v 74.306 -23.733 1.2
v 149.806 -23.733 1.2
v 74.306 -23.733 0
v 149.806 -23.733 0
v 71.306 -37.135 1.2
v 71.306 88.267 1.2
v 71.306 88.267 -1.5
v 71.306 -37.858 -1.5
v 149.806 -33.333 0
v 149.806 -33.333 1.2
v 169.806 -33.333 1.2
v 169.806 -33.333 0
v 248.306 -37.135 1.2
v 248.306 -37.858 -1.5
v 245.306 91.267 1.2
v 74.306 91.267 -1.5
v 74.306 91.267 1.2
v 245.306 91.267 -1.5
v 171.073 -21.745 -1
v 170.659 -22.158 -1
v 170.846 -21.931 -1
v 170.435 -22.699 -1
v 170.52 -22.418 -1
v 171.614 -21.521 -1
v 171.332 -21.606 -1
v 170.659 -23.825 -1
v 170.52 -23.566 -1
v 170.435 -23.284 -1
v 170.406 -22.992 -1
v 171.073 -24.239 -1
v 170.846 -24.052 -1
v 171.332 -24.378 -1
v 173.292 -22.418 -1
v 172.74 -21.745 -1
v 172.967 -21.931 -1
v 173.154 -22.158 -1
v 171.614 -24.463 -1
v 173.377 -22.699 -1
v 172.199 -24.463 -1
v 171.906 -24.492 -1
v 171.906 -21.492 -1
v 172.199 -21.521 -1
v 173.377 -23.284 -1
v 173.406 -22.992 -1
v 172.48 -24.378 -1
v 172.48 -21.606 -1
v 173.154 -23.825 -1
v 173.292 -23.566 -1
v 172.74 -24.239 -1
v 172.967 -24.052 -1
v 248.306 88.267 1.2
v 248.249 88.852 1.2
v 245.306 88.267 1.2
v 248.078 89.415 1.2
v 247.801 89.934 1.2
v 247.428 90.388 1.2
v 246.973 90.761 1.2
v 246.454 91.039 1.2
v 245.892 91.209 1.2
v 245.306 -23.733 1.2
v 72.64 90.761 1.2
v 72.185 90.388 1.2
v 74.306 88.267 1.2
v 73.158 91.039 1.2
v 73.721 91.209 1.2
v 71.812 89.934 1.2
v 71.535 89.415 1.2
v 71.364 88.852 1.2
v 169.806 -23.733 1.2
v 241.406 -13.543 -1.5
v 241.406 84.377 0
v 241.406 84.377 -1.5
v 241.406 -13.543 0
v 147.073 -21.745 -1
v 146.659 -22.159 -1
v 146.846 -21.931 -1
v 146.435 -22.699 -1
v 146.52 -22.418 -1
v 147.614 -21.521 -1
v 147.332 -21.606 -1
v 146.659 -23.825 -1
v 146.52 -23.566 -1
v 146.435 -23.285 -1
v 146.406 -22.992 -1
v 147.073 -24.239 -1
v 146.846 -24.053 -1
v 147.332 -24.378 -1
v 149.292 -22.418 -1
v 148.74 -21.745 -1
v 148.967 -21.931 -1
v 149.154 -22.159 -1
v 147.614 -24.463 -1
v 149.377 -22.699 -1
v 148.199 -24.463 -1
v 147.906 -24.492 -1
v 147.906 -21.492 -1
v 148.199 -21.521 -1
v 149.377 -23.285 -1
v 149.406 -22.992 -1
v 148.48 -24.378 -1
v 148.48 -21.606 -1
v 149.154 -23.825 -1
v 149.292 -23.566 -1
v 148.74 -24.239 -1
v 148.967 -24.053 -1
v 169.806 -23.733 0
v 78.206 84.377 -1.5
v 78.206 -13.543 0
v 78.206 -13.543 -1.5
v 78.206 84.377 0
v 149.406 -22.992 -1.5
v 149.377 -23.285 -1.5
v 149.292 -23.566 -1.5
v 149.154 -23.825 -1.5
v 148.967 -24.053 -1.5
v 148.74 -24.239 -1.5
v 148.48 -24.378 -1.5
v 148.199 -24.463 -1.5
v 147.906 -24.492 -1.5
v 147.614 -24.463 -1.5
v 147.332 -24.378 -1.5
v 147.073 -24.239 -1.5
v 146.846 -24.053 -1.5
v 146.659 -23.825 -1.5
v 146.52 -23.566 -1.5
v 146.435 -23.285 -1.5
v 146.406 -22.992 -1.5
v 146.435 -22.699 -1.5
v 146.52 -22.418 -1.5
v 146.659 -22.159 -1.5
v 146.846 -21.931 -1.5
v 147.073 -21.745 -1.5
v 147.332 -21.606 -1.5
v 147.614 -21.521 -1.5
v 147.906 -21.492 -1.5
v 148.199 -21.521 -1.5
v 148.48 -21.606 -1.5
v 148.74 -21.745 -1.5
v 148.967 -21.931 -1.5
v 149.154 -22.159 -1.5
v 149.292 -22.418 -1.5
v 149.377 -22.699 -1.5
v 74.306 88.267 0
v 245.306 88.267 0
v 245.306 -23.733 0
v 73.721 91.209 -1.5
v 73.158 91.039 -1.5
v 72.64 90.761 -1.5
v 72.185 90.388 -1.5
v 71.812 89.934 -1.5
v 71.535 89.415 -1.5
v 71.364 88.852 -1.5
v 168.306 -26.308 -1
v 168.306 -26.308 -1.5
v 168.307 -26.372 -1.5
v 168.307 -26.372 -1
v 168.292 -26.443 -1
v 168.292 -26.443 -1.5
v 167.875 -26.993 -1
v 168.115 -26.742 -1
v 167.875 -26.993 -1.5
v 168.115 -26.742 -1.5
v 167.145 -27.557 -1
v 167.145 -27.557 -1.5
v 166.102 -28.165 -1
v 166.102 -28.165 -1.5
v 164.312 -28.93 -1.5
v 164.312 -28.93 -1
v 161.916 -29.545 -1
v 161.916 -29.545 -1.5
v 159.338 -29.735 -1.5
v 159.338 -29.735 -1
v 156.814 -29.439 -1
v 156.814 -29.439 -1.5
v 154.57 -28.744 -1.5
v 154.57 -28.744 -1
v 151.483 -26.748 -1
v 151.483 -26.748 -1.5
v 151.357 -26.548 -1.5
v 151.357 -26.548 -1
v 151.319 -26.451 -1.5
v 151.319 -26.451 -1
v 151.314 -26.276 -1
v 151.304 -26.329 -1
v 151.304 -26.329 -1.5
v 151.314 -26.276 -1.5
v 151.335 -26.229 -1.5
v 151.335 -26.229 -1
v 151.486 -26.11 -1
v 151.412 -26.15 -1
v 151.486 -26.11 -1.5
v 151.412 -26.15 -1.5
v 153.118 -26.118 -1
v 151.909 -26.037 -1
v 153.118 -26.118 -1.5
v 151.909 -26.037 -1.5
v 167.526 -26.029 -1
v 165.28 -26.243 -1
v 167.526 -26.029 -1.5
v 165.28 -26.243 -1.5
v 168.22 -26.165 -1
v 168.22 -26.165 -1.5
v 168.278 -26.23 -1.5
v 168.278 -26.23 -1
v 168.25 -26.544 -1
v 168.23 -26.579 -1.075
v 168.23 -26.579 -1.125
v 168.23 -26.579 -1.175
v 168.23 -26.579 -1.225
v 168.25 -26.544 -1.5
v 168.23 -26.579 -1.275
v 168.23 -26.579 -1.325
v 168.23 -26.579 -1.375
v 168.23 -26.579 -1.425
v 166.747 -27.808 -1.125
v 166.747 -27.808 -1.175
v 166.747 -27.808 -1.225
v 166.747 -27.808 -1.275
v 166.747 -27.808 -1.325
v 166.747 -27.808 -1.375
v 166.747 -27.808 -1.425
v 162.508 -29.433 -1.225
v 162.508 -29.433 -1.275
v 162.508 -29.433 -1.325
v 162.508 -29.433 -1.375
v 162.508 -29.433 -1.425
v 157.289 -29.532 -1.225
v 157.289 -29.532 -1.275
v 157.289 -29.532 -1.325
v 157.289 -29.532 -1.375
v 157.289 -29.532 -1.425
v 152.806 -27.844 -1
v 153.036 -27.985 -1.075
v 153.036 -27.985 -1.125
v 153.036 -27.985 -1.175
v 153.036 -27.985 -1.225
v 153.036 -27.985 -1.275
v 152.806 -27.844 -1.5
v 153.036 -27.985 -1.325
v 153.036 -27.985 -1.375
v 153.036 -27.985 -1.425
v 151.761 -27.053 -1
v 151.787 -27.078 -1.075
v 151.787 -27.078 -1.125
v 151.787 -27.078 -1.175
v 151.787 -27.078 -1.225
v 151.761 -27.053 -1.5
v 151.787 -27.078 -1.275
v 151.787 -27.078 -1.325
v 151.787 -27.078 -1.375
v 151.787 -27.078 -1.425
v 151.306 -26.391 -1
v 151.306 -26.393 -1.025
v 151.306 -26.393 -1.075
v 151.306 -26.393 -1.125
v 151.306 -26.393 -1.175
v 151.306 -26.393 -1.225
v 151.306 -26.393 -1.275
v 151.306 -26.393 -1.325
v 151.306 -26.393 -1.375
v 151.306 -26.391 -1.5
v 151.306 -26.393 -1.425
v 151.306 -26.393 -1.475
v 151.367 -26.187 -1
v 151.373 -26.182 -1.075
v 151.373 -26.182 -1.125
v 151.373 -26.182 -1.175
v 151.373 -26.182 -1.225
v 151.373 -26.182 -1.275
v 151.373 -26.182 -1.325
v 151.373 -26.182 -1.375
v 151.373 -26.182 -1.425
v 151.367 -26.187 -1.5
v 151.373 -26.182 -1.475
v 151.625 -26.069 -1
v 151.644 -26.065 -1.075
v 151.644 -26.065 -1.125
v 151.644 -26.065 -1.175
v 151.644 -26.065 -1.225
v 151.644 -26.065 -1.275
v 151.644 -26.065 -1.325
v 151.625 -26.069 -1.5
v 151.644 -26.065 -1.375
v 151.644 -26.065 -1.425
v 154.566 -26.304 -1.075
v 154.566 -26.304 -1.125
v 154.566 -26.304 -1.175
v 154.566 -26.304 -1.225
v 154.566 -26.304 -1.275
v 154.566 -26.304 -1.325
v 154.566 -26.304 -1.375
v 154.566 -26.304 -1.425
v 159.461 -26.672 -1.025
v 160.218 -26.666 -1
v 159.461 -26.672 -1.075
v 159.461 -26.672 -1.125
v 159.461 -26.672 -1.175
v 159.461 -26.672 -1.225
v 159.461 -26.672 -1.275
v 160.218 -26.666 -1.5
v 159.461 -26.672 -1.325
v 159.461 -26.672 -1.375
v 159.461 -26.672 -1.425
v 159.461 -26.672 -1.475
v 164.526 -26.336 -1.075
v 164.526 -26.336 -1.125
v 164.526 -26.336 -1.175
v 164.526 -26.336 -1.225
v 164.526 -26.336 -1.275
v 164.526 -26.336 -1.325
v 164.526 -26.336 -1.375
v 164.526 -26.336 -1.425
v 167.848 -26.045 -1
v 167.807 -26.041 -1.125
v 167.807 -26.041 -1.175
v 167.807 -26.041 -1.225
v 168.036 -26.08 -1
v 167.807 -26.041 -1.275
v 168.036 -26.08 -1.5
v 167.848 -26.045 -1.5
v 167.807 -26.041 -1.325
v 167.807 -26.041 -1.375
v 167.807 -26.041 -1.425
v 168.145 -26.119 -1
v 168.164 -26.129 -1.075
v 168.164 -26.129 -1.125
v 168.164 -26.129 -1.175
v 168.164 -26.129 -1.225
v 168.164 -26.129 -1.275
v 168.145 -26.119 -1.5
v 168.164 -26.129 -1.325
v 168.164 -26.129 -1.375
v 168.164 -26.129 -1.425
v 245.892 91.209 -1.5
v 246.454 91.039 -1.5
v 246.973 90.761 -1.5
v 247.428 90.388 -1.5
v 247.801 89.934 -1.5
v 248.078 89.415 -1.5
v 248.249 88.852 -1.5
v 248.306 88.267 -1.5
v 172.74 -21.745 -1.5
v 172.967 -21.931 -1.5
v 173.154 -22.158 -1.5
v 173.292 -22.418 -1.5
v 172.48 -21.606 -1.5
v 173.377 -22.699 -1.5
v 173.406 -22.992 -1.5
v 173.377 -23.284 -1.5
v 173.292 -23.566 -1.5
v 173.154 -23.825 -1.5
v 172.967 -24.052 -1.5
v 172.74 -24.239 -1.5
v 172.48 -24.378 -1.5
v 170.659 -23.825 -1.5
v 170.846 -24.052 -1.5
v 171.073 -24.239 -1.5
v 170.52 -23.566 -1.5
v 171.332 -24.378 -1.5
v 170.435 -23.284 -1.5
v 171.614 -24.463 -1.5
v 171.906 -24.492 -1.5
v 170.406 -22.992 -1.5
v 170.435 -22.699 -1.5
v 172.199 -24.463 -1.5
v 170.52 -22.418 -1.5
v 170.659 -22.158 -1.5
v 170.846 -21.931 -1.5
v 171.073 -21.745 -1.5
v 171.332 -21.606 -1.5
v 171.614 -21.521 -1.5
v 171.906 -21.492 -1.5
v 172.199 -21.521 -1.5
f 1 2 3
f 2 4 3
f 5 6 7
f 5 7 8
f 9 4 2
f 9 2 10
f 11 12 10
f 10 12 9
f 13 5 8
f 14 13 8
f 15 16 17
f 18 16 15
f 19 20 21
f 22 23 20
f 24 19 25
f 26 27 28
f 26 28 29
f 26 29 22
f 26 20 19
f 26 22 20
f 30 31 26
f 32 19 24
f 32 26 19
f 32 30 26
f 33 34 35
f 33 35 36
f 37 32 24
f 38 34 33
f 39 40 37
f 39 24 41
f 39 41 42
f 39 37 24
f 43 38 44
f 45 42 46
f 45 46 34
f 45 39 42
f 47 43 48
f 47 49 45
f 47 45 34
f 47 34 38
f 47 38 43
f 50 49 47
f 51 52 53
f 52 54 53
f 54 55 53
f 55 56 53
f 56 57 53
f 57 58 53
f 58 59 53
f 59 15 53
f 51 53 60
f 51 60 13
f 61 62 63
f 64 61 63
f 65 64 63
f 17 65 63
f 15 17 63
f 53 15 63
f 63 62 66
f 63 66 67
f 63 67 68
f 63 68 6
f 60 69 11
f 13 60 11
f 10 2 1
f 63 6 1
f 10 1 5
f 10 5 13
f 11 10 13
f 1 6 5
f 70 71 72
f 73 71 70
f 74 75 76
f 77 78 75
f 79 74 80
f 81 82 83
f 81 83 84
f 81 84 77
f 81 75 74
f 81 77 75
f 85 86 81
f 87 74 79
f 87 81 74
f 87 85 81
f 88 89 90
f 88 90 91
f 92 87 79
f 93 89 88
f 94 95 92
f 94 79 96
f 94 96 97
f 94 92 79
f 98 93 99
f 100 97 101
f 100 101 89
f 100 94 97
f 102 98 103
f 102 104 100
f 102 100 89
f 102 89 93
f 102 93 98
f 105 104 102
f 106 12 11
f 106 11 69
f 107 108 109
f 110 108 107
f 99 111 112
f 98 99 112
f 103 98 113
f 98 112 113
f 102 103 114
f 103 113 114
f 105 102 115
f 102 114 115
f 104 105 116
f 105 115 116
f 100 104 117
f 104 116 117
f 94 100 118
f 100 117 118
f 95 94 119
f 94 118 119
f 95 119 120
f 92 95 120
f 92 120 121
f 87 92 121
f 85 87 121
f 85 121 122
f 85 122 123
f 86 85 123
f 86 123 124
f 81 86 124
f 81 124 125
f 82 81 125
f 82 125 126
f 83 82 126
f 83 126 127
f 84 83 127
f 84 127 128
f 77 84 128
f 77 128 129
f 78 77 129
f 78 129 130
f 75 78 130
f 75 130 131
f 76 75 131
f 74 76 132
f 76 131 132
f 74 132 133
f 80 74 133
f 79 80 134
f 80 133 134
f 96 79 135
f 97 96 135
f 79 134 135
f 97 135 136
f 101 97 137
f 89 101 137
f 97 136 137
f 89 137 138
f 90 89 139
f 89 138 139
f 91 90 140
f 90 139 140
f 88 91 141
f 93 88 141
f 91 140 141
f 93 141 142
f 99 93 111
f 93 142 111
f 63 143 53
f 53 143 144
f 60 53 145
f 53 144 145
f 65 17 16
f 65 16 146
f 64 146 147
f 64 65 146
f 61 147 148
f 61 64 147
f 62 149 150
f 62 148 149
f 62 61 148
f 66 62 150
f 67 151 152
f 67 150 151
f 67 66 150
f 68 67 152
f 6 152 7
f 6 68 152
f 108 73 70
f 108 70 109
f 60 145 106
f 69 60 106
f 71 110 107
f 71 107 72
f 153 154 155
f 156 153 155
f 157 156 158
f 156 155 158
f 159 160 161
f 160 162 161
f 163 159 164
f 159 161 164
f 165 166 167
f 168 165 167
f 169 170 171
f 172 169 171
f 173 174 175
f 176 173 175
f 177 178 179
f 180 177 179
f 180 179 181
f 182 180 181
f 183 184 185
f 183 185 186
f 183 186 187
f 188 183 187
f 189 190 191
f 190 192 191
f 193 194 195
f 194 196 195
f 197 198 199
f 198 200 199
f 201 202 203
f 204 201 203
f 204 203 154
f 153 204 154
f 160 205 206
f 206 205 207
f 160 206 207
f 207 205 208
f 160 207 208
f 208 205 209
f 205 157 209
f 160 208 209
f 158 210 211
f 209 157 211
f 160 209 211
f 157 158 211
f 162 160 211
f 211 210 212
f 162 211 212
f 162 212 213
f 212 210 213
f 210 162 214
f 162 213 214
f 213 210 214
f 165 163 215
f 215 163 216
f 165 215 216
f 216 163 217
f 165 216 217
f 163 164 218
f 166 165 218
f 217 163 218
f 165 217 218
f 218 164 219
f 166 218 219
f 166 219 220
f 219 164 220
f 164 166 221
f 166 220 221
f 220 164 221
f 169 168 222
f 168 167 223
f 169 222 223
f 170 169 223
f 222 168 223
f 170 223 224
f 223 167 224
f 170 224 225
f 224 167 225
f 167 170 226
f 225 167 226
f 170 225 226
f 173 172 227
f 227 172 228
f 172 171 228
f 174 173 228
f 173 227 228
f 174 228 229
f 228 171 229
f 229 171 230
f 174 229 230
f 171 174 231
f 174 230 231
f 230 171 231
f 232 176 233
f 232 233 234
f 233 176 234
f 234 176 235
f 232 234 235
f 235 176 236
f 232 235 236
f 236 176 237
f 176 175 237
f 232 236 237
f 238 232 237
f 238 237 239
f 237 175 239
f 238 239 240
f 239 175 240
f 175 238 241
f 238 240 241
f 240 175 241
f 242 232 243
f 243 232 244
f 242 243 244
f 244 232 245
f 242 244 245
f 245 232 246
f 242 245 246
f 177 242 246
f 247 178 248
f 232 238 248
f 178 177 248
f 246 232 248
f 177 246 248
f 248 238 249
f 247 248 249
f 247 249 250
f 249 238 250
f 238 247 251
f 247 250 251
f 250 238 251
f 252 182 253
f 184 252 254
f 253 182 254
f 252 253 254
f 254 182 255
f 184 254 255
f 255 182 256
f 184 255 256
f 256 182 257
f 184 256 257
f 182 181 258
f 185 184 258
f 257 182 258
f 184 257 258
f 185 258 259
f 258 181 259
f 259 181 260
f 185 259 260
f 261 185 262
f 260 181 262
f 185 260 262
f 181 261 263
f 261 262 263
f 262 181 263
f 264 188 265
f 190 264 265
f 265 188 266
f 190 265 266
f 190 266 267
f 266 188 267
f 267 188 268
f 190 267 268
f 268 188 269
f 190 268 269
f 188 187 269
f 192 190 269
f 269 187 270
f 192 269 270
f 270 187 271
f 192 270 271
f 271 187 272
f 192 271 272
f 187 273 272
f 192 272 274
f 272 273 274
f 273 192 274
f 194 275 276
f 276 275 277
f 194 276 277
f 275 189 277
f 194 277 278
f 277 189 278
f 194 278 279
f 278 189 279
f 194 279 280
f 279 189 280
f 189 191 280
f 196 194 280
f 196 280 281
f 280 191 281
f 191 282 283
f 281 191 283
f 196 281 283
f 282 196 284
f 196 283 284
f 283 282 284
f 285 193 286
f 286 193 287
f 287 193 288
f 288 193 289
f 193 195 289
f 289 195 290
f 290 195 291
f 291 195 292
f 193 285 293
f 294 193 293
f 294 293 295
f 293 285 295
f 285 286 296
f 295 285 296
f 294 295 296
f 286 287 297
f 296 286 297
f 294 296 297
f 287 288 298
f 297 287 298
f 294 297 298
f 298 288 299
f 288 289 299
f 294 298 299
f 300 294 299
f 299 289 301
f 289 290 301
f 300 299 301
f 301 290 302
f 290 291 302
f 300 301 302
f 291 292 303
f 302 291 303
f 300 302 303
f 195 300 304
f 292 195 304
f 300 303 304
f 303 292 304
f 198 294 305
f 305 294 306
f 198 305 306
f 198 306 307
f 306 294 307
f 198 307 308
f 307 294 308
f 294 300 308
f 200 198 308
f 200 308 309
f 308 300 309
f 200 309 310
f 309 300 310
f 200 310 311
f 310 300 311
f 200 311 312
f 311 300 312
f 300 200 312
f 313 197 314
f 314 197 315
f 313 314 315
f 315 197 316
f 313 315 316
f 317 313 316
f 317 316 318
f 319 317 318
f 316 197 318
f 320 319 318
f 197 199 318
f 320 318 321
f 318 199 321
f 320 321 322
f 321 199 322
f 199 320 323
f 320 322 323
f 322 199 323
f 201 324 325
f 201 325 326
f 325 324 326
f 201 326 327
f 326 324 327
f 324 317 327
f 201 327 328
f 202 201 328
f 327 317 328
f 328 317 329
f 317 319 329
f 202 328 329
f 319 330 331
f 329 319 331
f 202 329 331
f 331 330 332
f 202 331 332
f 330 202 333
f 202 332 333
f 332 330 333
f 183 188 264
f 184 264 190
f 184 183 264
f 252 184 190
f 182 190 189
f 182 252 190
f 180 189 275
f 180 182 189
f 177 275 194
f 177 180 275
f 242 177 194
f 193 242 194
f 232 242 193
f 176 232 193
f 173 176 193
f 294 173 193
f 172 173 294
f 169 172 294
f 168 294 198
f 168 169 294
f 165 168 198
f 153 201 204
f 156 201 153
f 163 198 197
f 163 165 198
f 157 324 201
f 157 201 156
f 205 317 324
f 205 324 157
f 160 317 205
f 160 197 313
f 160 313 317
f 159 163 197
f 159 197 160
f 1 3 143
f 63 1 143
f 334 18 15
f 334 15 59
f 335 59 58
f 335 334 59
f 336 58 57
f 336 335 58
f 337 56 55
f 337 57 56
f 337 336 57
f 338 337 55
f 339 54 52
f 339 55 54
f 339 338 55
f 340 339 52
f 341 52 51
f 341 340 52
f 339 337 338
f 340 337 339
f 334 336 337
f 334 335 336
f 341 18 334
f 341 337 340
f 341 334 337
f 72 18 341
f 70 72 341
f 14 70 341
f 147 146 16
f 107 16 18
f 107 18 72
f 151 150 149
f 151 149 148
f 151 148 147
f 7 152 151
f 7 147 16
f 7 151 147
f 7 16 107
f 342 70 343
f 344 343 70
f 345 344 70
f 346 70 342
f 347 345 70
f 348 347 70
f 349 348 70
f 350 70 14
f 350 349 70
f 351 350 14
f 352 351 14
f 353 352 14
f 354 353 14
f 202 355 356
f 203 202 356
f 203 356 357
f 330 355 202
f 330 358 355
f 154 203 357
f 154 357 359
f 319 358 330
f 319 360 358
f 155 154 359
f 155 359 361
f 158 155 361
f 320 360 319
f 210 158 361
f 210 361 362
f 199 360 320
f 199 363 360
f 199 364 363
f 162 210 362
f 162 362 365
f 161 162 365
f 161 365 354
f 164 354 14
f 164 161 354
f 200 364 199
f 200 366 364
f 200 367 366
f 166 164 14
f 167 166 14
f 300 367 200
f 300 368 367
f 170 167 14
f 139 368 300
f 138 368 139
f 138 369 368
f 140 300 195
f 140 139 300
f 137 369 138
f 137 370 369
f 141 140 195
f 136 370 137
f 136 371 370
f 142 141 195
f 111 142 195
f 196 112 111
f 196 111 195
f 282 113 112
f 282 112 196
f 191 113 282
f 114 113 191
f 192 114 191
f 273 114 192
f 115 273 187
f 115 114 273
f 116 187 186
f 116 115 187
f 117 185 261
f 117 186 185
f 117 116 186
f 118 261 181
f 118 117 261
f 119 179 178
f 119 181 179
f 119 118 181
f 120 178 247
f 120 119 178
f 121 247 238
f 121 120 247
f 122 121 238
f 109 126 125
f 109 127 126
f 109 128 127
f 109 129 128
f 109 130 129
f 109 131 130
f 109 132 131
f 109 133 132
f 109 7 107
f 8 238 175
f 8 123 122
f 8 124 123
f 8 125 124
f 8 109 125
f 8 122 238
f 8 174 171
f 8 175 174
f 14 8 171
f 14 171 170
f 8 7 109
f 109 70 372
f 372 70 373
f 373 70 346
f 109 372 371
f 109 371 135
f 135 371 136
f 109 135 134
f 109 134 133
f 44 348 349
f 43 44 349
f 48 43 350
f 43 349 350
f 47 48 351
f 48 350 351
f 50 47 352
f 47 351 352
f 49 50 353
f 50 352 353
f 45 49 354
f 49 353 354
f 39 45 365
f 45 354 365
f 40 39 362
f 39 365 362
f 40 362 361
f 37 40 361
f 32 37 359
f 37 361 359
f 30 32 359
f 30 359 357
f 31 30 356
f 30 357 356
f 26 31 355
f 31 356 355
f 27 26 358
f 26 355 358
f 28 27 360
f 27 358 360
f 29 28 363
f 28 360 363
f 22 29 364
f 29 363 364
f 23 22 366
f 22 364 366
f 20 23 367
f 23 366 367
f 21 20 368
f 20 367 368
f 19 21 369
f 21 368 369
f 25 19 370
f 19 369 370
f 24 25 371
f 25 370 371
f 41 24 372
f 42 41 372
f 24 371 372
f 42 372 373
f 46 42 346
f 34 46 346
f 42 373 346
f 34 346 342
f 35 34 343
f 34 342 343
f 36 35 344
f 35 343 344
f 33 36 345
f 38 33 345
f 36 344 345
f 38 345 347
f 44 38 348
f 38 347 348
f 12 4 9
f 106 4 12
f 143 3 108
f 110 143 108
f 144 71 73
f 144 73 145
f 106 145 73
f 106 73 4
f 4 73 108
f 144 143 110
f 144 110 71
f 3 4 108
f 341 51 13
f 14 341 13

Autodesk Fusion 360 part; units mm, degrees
sketch "Sketch1" plane through (0, 0, 0) normal (0, 0, 1) x (1, 0, 0)
  line L0 (78.2063, 84.3769) -> (241.4063, 84.3769)
  line L1 (241.4063, 84.3769) -> (241.4063, -13.5431)
  line L2 (241.4063, -13.5431) -> (78.2063, -13.5431)
  line L3 (78.2063, -13.5431) -> (78.2063, 84.3769)
  line L4 (74.7063, 87.8669) -> (244.9063, 87.8669)
  line L5 (244.9063, 87.8669) -> (244.9063, -23.3331)
  line L6 (244.9063, -23.3331) -> (74.7063, -23.3331)
  line L7 (74.7063, -23.3331) -> (74.7063, 87.8669)
  line L8 (74.7063, 87.8669) -> (244.9063, 87.8669)
  line L9 (244.9063, 87.8669) -> (244.9063, -33.3331)
  line L10 (244.9063, -33.3331) -> (74.7063, -33.3331)
  line L11 (74.7063, -33.3331) -> (74.7063, 87.8669)
  line L12 (149.8063, -33.3331) -> (169.8063, -33.3331)
  line L13 (169.8063, -33.3331) -> (169.8063, -23.3331)
  line L14 (169.8063, -23.3331) -> (149.8063, -23.3331)
  line L15 (149.8063, -23.3331) -> (149.8063, -33.3331)
  line L16 (71.3063, 91.2669) -> (248.3063, 91.2669)
  line L17 (248.3063, 91.2669) -> (248.3063, -36.7331)
  line L18 (248.3063, -36.7331) -> (71.3063, -36.7331)
  line L19 (71.3063, -36.7331) -> (71.3063, 91.2669)
  line L20 (74.3063, 88.2669) -> (245.3063, 88.2669)
  line L21 (245.3063, 88.2669) -> (245.3063, -23.7331)
  line L22 (245.3063, -23.7331) -> (74.3063, -23.7331)
  line L23 (74.3063, -23.7331) -> (74.3063, 88.2669)
  dimension "d1" = 97.92
  dimension "d2" = 163.2
  dimension "d3" = 170.2
  dimension "d4" = 3.5
  dimension "d5" = 111.2
  dimension "d6" = 3.49
  dimension "d7" = 10
  dimension "d8" = 20
  dimension "d9" = 75.1
  dimension "d11" = -3.4
  dimension "d34" = -0.4
  dimension "d35" = 75.1
extrude "Extrude1" add sketch "Sketch1" against normal blind 1.5 contours L4 L5 L7 L8 L9 L11 L20 L21 L22 L23 | L4 L5 L6 L7 L8 L9 L11 L14 | L6 L11 L15 L22 | L6 L9 L13 L22 | L6 L13 L14 L15 L22 | L10 L11 L15 L22 | L9 L10 L13 L22 | L10 L12 L13 L15 L22 | L16 L17 L18 L19
extrude "Extrude2" add sketch "Sketch1" along normal blind 1.2 contours L10 L11 L15 L22 | L9 L10 L13 L22 | L16 L17 L18 L19
sketch "Sketch2" plane through (71.3063, 0, 0) normal (-1, 0, 0) x (0, -1, 0)
  line L0 (-91.2669, 1.2) -> (-91.2669, -1.5)
  line L1 (-91.2669, -1.5) -> (36.7331, -1.5)
  line L2 (36.7331, -1.5) -> (36.7331, 1.2)
  line L3 (36.7331, 1.2) -> (-91.2669, 1.2)
  line L4 (36.7331, -1.5) -> (33.0912, -1.5)
  line L5 (33.0912, -1.5) -> (33.0912, 2.7)
  line L6 (33.0912, 2.7) -> (36.7331, 2.7)
  line L7 (36.7331, 2.7) -> (36.7331, -1.5)
  line L8 (36.7331, 2.7) -> (38.5941, -4.2455)
  line L9 (36.7331, 2.7) -> (43.6271, 2.7) construction
  line L10 (36.7331, -1.5) -> (39.5381, -1.5)
  line L11 (35.2766, 1.2) -> (42.4884, 1.2)
  dimension "d16" = 1.5
  dimension "d17" = 75
extrude "Extrude3" add sketch "Sketch2" against normal up to surface (177 mm away) contours L2 L7 L8 L10 L11
fillet "Fillet1" radius 3 2 edges at (71.3063, 91.2669, -0.15) (248.3063, 91.2669, -0.15)
sketch "Sketch3" plane through (0, 0, -1.5) normal (0, 0, -1) x (1, 0, 0)
  arc A0 (245.3063, -91.2669) -> (248.3063, -88.2669) centre (245.3063, -88.2669) ccw
  line L0 (248.3063, -88.2669) -> (248.3063, 37.8584)
  line L1 (248.3063, 37.8584) -> (71.3063, 37.8584)
  line L2 (71.3063, 37.8584) -> (71.3063, -88.2669)
  arc A1 (71.3063, -88.2669) -> (74.3063, -91.2669) centre (74.3063, -88.2669) ccw
  line L3 (74.3063, -91.2669) -> (245.3063, -91.2669)
  line L4 (78.2063, 13.5431) -> (241.4063, 13.5431)
  line L5 (241.4063, 13.5431) -> (241.4063, -84.3769)
  line L6 (241.4063, -84.3769) -> (78.2063, -84.3769)
  line L7 (78.2063, -84.3769) -> (78.2063, 13.5431)
  spline S0 degree 5 poles (168.3063, 26.3081) (168.3195, 26.3986) (168.2582, 26.6166) (167.9024, 27.0513) (166.9216, 27.7962) (164.9941, 28.7753) (162.5706, 29.5411) (159.8951, 29.8719) (157.2258, 29.6505) (154.8107, 28.9513) (152.8718, 27.9853) (151.5916, 27.0179) (151.0968, 26.2949) (151.4435, 25.9718) (152.5955, 26.024) (154.4375, 26.2989) (156.7949, 26.5955) (159.4487, 26.7323) (162.1514, 26.6209) (164.6413, 26.3369) (166.6674, 26.0492) (167.7451, 25.9733) (168.179, 26.0739) (168.2931, 26.2177) (168.3063, 26.3081) knots 0 0 0 0 0 0 0.05 0.1 0.15 0.2 0.25 0.3 0.35 0.4 0.45 0.5 0.55 0.6 0.65 0.7 0.75 0.8 0.85 0.9 0.95 1 1 1 1 1 1
  circle A2 centre (171.9063, 22.9918) radius 1.5
  circle A3 centre (147.9063, 22.9919) radius 1.5
  point P0 (159.4063, 29.7363)
  point P1 (151.3063, 26.3081)
  point P2 (159.4063, 26.6713)
  dimension "d22" = 80
  dimension "d23" = 80
  dimension "d24" = 3
  dimension "d25" = 3
  dimension "d26" = 88.1
  dimension "d27" = 88.9
  dimension "d28" = 88.1
  dimension "d29" = 24
  dimension "d30" = 3.6
  dimension "d31" = 0.0001
  dimension "d36" = 3.4
sketch "Sketch4" plane through (0, 0, -1.5) normal (0, 0, -1) x (1, 0, 0)
extrude "Extrude4" cut sketch "Sketch3" against normal blind 0.5 contours S0 | A2 | A3
